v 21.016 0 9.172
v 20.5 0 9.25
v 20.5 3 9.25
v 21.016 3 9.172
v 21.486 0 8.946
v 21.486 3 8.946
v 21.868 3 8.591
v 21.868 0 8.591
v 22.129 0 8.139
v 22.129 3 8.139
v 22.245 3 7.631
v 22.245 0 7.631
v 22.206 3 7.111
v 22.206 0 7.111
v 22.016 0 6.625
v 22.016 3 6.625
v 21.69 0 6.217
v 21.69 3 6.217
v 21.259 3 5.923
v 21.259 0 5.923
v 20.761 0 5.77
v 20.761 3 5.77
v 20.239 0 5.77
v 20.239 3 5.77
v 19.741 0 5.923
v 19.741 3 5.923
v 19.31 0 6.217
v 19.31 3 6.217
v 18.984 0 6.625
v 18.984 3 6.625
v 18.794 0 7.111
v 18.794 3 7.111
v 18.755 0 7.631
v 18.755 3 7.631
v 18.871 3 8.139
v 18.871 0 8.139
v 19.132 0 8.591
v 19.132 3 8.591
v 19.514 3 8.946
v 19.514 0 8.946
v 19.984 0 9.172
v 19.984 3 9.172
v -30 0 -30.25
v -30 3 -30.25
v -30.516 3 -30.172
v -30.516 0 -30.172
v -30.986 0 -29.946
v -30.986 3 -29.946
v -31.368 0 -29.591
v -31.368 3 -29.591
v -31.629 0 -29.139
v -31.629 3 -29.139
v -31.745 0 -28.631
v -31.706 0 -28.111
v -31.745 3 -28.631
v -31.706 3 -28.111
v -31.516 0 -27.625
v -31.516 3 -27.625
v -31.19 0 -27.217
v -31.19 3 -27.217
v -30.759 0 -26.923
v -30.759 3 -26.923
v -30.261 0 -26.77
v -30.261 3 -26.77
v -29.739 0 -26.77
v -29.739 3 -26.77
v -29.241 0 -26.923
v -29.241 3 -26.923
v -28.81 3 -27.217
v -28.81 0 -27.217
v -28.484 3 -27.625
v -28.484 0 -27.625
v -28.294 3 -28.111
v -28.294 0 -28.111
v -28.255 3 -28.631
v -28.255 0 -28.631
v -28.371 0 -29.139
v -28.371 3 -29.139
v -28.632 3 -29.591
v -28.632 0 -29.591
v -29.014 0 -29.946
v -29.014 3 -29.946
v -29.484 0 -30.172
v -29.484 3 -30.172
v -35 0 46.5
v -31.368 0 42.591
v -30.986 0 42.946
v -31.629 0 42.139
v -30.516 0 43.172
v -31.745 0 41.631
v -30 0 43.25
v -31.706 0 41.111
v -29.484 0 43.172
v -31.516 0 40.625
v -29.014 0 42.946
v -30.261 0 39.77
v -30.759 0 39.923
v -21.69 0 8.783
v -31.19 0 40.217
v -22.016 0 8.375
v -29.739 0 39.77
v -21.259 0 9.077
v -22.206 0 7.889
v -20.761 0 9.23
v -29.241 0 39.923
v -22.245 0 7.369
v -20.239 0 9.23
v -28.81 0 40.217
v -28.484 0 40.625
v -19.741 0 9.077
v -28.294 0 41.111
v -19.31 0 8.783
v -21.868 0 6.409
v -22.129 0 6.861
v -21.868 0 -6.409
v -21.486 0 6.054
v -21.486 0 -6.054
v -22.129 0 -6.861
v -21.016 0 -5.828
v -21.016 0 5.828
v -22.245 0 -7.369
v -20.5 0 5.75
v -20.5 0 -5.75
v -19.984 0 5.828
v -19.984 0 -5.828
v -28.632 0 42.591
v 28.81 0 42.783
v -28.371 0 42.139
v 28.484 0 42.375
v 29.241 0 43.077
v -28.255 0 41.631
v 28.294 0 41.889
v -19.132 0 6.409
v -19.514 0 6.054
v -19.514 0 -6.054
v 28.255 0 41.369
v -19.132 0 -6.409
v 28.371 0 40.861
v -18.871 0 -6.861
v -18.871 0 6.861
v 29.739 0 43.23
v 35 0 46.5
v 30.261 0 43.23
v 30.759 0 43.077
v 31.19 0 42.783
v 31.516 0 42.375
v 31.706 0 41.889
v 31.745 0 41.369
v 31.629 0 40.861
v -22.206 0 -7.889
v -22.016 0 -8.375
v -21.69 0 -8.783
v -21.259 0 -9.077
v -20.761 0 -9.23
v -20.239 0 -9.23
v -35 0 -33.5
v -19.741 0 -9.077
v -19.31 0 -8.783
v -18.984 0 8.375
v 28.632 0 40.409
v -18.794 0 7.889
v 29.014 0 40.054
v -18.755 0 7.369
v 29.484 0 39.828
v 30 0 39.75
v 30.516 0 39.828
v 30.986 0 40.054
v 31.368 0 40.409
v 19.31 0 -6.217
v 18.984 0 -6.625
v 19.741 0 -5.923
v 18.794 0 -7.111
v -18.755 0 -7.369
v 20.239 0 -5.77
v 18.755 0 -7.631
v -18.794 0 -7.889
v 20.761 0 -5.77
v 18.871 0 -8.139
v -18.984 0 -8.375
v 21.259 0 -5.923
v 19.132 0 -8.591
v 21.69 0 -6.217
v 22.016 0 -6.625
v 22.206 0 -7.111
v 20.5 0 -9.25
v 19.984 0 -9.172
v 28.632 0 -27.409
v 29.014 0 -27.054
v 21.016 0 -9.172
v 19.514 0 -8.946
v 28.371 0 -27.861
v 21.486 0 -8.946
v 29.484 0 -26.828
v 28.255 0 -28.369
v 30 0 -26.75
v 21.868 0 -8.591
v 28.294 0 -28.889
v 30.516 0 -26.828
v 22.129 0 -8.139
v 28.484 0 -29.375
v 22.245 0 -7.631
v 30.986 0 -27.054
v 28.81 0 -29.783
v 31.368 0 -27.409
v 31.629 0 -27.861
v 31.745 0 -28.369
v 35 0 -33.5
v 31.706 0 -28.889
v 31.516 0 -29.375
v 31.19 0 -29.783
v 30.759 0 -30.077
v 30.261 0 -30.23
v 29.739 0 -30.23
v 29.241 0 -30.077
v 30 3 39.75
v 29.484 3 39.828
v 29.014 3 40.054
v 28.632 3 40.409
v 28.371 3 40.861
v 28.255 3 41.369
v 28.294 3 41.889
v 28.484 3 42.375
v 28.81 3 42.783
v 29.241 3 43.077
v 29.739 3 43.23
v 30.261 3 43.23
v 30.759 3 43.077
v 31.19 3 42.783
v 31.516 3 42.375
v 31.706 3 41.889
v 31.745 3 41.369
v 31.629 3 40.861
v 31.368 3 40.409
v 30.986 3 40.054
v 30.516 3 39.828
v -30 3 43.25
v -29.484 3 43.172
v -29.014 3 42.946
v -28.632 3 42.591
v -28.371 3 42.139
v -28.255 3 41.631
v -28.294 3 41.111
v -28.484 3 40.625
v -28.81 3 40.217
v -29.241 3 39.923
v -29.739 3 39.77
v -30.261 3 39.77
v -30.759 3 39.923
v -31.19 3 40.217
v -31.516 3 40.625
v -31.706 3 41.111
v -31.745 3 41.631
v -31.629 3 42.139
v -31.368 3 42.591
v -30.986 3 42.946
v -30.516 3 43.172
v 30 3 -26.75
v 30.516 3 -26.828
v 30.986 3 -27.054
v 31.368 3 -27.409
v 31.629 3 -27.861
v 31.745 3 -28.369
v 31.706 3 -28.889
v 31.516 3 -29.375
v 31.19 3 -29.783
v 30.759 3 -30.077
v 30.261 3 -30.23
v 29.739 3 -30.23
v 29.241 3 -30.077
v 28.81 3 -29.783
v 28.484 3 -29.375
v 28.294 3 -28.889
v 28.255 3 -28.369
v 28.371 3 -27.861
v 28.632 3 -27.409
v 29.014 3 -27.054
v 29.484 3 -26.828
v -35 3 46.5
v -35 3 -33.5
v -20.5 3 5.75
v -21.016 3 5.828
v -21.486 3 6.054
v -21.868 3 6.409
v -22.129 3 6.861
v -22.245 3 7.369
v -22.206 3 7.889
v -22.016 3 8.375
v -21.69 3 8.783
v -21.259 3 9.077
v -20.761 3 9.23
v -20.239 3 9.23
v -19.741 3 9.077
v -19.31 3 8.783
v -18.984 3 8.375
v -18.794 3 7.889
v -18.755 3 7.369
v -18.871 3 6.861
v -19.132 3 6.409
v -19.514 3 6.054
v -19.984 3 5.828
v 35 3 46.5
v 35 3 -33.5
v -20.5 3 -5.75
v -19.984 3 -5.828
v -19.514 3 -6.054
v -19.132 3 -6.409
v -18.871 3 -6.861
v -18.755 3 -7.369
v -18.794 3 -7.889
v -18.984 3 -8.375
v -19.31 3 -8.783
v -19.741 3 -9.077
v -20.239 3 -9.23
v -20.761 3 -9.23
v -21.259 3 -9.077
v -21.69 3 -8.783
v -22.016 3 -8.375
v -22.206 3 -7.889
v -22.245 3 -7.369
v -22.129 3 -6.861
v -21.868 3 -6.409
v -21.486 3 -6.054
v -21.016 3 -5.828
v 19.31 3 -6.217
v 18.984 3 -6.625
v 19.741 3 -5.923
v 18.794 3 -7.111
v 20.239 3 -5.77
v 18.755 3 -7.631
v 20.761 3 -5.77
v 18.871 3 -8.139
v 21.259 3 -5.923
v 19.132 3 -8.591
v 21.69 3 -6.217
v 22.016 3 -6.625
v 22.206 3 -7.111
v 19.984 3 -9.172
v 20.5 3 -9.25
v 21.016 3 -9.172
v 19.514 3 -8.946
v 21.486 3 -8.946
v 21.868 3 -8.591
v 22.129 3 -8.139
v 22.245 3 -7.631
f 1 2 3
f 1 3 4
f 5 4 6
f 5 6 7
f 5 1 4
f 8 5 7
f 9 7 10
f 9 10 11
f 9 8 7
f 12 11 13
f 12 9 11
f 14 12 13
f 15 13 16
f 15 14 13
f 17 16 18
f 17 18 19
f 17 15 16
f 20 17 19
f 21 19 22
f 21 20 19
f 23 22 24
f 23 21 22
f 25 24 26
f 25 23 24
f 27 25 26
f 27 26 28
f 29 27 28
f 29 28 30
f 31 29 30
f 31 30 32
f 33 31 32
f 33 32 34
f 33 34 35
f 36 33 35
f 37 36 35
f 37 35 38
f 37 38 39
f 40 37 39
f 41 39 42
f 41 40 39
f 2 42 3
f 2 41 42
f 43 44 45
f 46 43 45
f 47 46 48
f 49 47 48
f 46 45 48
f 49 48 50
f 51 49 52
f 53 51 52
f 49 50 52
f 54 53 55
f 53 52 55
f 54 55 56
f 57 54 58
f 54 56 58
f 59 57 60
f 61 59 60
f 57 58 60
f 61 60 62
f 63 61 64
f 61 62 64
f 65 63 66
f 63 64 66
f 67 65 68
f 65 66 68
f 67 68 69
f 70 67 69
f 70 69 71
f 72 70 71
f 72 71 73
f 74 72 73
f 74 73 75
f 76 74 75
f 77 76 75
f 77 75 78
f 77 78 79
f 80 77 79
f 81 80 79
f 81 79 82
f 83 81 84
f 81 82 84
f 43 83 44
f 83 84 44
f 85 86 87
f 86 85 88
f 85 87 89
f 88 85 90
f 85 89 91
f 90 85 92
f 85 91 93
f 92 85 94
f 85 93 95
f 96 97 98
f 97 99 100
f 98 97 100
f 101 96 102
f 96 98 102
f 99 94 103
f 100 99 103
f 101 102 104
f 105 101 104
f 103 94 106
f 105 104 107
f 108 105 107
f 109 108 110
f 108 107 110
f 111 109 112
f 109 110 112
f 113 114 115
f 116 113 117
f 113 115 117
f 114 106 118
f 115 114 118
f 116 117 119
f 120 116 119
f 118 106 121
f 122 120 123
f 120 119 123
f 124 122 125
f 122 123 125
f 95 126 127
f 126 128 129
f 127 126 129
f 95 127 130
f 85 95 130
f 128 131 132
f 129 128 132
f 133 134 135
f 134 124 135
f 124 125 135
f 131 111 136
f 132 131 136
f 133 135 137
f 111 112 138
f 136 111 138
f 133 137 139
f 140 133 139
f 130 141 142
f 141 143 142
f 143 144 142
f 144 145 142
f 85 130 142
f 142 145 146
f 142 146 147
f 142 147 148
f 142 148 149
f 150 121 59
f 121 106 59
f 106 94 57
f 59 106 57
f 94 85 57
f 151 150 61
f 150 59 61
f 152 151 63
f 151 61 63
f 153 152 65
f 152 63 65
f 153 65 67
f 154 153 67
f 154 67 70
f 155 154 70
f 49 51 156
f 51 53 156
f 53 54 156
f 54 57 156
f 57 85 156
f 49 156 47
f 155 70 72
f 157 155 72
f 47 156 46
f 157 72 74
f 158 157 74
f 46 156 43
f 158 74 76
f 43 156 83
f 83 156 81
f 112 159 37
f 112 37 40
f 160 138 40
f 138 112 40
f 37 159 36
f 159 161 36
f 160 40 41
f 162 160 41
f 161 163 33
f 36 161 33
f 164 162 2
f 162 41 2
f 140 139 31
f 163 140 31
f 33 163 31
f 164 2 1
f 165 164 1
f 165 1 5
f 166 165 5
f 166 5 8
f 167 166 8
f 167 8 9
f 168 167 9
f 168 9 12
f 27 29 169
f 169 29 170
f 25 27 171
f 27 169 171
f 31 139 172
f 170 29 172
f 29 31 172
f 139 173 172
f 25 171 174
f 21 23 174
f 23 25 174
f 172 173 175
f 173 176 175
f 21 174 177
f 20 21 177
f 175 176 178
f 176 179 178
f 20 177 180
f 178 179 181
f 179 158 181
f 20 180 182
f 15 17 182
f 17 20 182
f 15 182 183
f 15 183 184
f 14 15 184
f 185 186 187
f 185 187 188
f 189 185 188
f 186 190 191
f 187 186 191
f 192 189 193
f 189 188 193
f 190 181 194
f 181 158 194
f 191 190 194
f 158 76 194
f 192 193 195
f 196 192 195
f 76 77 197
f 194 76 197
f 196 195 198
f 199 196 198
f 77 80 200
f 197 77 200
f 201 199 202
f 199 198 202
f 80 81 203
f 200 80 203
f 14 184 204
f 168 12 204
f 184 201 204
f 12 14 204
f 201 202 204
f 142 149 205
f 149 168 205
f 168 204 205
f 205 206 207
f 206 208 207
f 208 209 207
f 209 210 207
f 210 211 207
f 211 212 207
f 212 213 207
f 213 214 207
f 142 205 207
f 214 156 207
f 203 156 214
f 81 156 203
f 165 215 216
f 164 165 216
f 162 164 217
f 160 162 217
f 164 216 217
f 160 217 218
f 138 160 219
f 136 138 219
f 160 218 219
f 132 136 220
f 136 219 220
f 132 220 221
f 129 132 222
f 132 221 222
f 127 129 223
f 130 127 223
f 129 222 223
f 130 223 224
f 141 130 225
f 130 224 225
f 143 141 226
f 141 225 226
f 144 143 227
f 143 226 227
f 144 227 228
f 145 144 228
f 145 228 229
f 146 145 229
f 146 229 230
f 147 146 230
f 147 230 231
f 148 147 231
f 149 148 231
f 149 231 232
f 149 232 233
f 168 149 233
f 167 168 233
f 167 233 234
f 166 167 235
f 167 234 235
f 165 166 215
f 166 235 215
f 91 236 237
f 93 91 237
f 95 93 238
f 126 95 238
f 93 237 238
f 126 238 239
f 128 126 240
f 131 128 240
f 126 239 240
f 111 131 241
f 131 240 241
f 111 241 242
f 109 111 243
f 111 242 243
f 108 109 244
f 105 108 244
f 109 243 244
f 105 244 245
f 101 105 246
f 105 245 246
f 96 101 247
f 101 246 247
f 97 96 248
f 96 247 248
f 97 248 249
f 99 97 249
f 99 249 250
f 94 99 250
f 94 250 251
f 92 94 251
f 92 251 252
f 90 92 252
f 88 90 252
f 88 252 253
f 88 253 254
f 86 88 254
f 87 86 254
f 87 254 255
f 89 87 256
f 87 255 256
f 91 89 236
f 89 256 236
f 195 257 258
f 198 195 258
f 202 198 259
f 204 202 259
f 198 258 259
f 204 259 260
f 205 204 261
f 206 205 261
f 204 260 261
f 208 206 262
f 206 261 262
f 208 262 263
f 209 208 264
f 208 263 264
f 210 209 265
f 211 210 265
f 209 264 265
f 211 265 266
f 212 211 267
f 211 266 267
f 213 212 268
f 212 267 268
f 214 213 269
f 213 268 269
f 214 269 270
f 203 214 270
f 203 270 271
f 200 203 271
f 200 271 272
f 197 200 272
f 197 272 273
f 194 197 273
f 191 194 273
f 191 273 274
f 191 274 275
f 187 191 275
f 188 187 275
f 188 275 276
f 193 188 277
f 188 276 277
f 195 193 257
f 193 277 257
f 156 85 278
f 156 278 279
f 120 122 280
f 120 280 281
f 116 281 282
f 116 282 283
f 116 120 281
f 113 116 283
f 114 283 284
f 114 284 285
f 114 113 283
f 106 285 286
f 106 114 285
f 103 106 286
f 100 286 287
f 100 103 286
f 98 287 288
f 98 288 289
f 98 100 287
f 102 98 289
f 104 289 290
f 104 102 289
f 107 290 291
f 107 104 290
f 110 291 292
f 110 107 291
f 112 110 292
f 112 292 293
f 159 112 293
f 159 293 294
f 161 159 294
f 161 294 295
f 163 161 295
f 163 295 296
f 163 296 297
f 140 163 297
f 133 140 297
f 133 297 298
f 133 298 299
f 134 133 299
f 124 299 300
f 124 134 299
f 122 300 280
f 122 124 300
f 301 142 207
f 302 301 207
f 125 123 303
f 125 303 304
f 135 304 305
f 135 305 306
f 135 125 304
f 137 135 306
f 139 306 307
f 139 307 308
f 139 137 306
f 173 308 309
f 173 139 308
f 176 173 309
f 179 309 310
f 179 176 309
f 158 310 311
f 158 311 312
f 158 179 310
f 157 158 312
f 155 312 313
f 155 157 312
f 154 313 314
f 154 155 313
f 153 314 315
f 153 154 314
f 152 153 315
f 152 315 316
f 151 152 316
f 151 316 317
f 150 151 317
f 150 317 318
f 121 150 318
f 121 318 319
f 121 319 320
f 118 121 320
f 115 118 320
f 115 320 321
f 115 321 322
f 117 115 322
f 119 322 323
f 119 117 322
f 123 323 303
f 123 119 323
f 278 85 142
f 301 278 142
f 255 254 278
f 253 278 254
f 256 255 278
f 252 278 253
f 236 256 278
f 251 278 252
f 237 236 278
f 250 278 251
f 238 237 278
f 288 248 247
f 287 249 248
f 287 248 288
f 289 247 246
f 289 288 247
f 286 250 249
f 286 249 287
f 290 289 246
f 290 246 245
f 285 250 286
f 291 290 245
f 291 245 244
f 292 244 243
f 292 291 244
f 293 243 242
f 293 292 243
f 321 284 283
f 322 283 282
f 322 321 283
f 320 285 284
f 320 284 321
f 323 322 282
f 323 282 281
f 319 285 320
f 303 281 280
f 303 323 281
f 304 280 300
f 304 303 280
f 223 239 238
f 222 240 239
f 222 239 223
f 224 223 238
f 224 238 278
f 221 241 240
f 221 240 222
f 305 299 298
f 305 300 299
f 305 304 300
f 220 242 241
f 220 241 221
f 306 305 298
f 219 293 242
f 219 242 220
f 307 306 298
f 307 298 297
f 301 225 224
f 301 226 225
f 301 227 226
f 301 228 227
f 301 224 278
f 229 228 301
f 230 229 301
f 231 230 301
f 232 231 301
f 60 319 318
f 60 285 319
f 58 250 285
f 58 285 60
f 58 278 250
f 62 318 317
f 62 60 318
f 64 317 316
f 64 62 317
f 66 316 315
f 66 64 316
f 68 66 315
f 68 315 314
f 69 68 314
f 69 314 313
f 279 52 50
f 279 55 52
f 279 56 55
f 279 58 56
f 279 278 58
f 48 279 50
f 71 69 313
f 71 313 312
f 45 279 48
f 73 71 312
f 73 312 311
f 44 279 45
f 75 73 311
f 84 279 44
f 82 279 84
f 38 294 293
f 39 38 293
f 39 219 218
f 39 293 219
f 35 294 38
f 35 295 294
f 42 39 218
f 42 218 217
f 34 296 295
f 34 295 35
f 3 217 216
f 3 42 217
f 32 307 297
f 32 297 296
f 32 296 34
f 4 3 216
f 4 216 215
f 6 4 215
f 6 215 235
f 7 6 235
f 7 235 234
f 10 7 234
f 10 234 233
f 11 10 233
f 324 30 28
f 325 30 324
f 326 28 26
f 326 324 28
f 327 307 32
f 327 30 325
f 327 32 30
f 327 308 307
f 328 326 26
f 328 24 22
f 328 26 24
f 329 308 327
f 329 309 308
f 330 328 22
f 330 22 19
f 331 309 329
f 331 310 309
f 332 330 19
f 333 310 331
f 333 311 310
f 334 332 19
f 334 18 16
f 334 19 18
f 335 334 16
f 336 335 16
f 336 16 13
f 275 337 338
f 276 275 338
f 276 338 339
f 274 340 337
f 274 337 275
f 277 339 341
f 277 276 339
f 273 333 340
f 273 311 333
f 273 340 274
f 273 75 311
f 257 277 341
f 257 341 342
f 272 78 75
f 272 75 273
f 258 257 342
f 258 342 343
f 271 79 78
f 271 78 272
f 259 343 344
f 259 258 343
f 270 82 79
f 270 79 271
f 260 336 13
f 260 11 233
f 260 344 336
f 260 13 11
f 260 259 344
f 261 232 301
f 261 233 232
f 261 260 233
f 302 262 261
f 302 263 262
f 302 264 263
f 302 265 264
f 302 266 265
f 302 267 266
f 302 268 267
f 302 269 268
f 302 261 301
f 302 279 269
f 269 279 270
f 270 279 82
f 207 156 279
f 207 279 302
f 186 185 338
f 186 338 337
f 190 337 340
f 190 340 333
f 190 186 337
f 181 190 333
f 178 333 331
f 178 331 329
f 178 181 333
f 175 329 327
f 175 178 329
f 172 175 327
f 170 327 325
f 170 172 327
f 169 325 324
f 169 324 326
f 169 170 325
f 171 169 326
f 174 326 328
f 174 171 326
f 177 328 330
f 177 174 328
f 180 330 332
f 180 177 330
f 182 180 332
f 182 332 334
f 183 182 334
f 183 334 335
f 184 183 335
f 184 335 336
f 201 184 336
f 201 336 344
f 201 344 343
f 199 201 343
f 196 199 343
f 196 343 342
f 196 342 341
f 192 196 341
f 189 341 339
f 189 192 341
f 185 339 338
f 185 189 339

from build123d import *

# Parameters (mm, degrees)
SKETCH1_W           = 70
SKETCH1_H           = 80
SKETCH1_R           = 1.75
BOSS_EXTRUDE1_DEPTH = 3
SKETCH2_R           = 1.75
CUT_EXTRUDE1_DEPTH  = 3


with BuildPart() as part:
    # Sketch1 → Boss-Extrude1 (new body)
    with BuildSketch(Plane(origin=(0, 0, 0), x_dir=(1, 0, 0), z_dir=(0, 1, 0))):
        with Locations((0, -6.5)):
            Rectangle(SKETCH1_W, SKETCH1_H)
        with Locations(Location((-20.5, 7.5, 0), (0, 0, 270))):
            Circle(SKETCH1_R, mode=Mode.SUBTRACT)
        with Locations(Location((-20.5, -7.5, 0), (0, 0, 90))):
            Circle(SKETCH1_R, mode=Mode.SUBTRACT)
        with Locations(Location((20.5, -7.5, 0), (0, 0, 270))):
            Circle(SKETCH1_R, mode=Mode.SUBTRACT)
        with Locations(Location((20.5, 7.5, 0), (0, 0, 90))):
            Circle(SKETCH1_R, mode=Mode.SUBTRACT)
    extrude(amount=BOSS_EXTRUDE1_DEPTH)

    # Sketch2 → Cut-Extrude1 (cut)
    with BuildSketch(Plane(origin=(0, 3, 0), x_dir=(1, 0, 0), z_dir=(0, 1, 0))):
        with Locations(Location((30, 28.5, 0), (0, 0, 270))):
            Circle(SKETCH2_R)
        with Locations(Location((-30, 28.5, 0), (0, 0, 90))):
            Circle(SKETCH2_R)
        with Locations(Location((30, -41.5, 0), (0, 0, 90))):
            Circle(SKETCH2_R)
        with Locations(Location((-30, -41.5, 0), (0, 0, 270))):
            Circle(SKETCH2_R)
    extrude(amount=-CUT_EXTRUDE1_DEPTH, mode=Mode.SUBTRACT)


solid = part.part
